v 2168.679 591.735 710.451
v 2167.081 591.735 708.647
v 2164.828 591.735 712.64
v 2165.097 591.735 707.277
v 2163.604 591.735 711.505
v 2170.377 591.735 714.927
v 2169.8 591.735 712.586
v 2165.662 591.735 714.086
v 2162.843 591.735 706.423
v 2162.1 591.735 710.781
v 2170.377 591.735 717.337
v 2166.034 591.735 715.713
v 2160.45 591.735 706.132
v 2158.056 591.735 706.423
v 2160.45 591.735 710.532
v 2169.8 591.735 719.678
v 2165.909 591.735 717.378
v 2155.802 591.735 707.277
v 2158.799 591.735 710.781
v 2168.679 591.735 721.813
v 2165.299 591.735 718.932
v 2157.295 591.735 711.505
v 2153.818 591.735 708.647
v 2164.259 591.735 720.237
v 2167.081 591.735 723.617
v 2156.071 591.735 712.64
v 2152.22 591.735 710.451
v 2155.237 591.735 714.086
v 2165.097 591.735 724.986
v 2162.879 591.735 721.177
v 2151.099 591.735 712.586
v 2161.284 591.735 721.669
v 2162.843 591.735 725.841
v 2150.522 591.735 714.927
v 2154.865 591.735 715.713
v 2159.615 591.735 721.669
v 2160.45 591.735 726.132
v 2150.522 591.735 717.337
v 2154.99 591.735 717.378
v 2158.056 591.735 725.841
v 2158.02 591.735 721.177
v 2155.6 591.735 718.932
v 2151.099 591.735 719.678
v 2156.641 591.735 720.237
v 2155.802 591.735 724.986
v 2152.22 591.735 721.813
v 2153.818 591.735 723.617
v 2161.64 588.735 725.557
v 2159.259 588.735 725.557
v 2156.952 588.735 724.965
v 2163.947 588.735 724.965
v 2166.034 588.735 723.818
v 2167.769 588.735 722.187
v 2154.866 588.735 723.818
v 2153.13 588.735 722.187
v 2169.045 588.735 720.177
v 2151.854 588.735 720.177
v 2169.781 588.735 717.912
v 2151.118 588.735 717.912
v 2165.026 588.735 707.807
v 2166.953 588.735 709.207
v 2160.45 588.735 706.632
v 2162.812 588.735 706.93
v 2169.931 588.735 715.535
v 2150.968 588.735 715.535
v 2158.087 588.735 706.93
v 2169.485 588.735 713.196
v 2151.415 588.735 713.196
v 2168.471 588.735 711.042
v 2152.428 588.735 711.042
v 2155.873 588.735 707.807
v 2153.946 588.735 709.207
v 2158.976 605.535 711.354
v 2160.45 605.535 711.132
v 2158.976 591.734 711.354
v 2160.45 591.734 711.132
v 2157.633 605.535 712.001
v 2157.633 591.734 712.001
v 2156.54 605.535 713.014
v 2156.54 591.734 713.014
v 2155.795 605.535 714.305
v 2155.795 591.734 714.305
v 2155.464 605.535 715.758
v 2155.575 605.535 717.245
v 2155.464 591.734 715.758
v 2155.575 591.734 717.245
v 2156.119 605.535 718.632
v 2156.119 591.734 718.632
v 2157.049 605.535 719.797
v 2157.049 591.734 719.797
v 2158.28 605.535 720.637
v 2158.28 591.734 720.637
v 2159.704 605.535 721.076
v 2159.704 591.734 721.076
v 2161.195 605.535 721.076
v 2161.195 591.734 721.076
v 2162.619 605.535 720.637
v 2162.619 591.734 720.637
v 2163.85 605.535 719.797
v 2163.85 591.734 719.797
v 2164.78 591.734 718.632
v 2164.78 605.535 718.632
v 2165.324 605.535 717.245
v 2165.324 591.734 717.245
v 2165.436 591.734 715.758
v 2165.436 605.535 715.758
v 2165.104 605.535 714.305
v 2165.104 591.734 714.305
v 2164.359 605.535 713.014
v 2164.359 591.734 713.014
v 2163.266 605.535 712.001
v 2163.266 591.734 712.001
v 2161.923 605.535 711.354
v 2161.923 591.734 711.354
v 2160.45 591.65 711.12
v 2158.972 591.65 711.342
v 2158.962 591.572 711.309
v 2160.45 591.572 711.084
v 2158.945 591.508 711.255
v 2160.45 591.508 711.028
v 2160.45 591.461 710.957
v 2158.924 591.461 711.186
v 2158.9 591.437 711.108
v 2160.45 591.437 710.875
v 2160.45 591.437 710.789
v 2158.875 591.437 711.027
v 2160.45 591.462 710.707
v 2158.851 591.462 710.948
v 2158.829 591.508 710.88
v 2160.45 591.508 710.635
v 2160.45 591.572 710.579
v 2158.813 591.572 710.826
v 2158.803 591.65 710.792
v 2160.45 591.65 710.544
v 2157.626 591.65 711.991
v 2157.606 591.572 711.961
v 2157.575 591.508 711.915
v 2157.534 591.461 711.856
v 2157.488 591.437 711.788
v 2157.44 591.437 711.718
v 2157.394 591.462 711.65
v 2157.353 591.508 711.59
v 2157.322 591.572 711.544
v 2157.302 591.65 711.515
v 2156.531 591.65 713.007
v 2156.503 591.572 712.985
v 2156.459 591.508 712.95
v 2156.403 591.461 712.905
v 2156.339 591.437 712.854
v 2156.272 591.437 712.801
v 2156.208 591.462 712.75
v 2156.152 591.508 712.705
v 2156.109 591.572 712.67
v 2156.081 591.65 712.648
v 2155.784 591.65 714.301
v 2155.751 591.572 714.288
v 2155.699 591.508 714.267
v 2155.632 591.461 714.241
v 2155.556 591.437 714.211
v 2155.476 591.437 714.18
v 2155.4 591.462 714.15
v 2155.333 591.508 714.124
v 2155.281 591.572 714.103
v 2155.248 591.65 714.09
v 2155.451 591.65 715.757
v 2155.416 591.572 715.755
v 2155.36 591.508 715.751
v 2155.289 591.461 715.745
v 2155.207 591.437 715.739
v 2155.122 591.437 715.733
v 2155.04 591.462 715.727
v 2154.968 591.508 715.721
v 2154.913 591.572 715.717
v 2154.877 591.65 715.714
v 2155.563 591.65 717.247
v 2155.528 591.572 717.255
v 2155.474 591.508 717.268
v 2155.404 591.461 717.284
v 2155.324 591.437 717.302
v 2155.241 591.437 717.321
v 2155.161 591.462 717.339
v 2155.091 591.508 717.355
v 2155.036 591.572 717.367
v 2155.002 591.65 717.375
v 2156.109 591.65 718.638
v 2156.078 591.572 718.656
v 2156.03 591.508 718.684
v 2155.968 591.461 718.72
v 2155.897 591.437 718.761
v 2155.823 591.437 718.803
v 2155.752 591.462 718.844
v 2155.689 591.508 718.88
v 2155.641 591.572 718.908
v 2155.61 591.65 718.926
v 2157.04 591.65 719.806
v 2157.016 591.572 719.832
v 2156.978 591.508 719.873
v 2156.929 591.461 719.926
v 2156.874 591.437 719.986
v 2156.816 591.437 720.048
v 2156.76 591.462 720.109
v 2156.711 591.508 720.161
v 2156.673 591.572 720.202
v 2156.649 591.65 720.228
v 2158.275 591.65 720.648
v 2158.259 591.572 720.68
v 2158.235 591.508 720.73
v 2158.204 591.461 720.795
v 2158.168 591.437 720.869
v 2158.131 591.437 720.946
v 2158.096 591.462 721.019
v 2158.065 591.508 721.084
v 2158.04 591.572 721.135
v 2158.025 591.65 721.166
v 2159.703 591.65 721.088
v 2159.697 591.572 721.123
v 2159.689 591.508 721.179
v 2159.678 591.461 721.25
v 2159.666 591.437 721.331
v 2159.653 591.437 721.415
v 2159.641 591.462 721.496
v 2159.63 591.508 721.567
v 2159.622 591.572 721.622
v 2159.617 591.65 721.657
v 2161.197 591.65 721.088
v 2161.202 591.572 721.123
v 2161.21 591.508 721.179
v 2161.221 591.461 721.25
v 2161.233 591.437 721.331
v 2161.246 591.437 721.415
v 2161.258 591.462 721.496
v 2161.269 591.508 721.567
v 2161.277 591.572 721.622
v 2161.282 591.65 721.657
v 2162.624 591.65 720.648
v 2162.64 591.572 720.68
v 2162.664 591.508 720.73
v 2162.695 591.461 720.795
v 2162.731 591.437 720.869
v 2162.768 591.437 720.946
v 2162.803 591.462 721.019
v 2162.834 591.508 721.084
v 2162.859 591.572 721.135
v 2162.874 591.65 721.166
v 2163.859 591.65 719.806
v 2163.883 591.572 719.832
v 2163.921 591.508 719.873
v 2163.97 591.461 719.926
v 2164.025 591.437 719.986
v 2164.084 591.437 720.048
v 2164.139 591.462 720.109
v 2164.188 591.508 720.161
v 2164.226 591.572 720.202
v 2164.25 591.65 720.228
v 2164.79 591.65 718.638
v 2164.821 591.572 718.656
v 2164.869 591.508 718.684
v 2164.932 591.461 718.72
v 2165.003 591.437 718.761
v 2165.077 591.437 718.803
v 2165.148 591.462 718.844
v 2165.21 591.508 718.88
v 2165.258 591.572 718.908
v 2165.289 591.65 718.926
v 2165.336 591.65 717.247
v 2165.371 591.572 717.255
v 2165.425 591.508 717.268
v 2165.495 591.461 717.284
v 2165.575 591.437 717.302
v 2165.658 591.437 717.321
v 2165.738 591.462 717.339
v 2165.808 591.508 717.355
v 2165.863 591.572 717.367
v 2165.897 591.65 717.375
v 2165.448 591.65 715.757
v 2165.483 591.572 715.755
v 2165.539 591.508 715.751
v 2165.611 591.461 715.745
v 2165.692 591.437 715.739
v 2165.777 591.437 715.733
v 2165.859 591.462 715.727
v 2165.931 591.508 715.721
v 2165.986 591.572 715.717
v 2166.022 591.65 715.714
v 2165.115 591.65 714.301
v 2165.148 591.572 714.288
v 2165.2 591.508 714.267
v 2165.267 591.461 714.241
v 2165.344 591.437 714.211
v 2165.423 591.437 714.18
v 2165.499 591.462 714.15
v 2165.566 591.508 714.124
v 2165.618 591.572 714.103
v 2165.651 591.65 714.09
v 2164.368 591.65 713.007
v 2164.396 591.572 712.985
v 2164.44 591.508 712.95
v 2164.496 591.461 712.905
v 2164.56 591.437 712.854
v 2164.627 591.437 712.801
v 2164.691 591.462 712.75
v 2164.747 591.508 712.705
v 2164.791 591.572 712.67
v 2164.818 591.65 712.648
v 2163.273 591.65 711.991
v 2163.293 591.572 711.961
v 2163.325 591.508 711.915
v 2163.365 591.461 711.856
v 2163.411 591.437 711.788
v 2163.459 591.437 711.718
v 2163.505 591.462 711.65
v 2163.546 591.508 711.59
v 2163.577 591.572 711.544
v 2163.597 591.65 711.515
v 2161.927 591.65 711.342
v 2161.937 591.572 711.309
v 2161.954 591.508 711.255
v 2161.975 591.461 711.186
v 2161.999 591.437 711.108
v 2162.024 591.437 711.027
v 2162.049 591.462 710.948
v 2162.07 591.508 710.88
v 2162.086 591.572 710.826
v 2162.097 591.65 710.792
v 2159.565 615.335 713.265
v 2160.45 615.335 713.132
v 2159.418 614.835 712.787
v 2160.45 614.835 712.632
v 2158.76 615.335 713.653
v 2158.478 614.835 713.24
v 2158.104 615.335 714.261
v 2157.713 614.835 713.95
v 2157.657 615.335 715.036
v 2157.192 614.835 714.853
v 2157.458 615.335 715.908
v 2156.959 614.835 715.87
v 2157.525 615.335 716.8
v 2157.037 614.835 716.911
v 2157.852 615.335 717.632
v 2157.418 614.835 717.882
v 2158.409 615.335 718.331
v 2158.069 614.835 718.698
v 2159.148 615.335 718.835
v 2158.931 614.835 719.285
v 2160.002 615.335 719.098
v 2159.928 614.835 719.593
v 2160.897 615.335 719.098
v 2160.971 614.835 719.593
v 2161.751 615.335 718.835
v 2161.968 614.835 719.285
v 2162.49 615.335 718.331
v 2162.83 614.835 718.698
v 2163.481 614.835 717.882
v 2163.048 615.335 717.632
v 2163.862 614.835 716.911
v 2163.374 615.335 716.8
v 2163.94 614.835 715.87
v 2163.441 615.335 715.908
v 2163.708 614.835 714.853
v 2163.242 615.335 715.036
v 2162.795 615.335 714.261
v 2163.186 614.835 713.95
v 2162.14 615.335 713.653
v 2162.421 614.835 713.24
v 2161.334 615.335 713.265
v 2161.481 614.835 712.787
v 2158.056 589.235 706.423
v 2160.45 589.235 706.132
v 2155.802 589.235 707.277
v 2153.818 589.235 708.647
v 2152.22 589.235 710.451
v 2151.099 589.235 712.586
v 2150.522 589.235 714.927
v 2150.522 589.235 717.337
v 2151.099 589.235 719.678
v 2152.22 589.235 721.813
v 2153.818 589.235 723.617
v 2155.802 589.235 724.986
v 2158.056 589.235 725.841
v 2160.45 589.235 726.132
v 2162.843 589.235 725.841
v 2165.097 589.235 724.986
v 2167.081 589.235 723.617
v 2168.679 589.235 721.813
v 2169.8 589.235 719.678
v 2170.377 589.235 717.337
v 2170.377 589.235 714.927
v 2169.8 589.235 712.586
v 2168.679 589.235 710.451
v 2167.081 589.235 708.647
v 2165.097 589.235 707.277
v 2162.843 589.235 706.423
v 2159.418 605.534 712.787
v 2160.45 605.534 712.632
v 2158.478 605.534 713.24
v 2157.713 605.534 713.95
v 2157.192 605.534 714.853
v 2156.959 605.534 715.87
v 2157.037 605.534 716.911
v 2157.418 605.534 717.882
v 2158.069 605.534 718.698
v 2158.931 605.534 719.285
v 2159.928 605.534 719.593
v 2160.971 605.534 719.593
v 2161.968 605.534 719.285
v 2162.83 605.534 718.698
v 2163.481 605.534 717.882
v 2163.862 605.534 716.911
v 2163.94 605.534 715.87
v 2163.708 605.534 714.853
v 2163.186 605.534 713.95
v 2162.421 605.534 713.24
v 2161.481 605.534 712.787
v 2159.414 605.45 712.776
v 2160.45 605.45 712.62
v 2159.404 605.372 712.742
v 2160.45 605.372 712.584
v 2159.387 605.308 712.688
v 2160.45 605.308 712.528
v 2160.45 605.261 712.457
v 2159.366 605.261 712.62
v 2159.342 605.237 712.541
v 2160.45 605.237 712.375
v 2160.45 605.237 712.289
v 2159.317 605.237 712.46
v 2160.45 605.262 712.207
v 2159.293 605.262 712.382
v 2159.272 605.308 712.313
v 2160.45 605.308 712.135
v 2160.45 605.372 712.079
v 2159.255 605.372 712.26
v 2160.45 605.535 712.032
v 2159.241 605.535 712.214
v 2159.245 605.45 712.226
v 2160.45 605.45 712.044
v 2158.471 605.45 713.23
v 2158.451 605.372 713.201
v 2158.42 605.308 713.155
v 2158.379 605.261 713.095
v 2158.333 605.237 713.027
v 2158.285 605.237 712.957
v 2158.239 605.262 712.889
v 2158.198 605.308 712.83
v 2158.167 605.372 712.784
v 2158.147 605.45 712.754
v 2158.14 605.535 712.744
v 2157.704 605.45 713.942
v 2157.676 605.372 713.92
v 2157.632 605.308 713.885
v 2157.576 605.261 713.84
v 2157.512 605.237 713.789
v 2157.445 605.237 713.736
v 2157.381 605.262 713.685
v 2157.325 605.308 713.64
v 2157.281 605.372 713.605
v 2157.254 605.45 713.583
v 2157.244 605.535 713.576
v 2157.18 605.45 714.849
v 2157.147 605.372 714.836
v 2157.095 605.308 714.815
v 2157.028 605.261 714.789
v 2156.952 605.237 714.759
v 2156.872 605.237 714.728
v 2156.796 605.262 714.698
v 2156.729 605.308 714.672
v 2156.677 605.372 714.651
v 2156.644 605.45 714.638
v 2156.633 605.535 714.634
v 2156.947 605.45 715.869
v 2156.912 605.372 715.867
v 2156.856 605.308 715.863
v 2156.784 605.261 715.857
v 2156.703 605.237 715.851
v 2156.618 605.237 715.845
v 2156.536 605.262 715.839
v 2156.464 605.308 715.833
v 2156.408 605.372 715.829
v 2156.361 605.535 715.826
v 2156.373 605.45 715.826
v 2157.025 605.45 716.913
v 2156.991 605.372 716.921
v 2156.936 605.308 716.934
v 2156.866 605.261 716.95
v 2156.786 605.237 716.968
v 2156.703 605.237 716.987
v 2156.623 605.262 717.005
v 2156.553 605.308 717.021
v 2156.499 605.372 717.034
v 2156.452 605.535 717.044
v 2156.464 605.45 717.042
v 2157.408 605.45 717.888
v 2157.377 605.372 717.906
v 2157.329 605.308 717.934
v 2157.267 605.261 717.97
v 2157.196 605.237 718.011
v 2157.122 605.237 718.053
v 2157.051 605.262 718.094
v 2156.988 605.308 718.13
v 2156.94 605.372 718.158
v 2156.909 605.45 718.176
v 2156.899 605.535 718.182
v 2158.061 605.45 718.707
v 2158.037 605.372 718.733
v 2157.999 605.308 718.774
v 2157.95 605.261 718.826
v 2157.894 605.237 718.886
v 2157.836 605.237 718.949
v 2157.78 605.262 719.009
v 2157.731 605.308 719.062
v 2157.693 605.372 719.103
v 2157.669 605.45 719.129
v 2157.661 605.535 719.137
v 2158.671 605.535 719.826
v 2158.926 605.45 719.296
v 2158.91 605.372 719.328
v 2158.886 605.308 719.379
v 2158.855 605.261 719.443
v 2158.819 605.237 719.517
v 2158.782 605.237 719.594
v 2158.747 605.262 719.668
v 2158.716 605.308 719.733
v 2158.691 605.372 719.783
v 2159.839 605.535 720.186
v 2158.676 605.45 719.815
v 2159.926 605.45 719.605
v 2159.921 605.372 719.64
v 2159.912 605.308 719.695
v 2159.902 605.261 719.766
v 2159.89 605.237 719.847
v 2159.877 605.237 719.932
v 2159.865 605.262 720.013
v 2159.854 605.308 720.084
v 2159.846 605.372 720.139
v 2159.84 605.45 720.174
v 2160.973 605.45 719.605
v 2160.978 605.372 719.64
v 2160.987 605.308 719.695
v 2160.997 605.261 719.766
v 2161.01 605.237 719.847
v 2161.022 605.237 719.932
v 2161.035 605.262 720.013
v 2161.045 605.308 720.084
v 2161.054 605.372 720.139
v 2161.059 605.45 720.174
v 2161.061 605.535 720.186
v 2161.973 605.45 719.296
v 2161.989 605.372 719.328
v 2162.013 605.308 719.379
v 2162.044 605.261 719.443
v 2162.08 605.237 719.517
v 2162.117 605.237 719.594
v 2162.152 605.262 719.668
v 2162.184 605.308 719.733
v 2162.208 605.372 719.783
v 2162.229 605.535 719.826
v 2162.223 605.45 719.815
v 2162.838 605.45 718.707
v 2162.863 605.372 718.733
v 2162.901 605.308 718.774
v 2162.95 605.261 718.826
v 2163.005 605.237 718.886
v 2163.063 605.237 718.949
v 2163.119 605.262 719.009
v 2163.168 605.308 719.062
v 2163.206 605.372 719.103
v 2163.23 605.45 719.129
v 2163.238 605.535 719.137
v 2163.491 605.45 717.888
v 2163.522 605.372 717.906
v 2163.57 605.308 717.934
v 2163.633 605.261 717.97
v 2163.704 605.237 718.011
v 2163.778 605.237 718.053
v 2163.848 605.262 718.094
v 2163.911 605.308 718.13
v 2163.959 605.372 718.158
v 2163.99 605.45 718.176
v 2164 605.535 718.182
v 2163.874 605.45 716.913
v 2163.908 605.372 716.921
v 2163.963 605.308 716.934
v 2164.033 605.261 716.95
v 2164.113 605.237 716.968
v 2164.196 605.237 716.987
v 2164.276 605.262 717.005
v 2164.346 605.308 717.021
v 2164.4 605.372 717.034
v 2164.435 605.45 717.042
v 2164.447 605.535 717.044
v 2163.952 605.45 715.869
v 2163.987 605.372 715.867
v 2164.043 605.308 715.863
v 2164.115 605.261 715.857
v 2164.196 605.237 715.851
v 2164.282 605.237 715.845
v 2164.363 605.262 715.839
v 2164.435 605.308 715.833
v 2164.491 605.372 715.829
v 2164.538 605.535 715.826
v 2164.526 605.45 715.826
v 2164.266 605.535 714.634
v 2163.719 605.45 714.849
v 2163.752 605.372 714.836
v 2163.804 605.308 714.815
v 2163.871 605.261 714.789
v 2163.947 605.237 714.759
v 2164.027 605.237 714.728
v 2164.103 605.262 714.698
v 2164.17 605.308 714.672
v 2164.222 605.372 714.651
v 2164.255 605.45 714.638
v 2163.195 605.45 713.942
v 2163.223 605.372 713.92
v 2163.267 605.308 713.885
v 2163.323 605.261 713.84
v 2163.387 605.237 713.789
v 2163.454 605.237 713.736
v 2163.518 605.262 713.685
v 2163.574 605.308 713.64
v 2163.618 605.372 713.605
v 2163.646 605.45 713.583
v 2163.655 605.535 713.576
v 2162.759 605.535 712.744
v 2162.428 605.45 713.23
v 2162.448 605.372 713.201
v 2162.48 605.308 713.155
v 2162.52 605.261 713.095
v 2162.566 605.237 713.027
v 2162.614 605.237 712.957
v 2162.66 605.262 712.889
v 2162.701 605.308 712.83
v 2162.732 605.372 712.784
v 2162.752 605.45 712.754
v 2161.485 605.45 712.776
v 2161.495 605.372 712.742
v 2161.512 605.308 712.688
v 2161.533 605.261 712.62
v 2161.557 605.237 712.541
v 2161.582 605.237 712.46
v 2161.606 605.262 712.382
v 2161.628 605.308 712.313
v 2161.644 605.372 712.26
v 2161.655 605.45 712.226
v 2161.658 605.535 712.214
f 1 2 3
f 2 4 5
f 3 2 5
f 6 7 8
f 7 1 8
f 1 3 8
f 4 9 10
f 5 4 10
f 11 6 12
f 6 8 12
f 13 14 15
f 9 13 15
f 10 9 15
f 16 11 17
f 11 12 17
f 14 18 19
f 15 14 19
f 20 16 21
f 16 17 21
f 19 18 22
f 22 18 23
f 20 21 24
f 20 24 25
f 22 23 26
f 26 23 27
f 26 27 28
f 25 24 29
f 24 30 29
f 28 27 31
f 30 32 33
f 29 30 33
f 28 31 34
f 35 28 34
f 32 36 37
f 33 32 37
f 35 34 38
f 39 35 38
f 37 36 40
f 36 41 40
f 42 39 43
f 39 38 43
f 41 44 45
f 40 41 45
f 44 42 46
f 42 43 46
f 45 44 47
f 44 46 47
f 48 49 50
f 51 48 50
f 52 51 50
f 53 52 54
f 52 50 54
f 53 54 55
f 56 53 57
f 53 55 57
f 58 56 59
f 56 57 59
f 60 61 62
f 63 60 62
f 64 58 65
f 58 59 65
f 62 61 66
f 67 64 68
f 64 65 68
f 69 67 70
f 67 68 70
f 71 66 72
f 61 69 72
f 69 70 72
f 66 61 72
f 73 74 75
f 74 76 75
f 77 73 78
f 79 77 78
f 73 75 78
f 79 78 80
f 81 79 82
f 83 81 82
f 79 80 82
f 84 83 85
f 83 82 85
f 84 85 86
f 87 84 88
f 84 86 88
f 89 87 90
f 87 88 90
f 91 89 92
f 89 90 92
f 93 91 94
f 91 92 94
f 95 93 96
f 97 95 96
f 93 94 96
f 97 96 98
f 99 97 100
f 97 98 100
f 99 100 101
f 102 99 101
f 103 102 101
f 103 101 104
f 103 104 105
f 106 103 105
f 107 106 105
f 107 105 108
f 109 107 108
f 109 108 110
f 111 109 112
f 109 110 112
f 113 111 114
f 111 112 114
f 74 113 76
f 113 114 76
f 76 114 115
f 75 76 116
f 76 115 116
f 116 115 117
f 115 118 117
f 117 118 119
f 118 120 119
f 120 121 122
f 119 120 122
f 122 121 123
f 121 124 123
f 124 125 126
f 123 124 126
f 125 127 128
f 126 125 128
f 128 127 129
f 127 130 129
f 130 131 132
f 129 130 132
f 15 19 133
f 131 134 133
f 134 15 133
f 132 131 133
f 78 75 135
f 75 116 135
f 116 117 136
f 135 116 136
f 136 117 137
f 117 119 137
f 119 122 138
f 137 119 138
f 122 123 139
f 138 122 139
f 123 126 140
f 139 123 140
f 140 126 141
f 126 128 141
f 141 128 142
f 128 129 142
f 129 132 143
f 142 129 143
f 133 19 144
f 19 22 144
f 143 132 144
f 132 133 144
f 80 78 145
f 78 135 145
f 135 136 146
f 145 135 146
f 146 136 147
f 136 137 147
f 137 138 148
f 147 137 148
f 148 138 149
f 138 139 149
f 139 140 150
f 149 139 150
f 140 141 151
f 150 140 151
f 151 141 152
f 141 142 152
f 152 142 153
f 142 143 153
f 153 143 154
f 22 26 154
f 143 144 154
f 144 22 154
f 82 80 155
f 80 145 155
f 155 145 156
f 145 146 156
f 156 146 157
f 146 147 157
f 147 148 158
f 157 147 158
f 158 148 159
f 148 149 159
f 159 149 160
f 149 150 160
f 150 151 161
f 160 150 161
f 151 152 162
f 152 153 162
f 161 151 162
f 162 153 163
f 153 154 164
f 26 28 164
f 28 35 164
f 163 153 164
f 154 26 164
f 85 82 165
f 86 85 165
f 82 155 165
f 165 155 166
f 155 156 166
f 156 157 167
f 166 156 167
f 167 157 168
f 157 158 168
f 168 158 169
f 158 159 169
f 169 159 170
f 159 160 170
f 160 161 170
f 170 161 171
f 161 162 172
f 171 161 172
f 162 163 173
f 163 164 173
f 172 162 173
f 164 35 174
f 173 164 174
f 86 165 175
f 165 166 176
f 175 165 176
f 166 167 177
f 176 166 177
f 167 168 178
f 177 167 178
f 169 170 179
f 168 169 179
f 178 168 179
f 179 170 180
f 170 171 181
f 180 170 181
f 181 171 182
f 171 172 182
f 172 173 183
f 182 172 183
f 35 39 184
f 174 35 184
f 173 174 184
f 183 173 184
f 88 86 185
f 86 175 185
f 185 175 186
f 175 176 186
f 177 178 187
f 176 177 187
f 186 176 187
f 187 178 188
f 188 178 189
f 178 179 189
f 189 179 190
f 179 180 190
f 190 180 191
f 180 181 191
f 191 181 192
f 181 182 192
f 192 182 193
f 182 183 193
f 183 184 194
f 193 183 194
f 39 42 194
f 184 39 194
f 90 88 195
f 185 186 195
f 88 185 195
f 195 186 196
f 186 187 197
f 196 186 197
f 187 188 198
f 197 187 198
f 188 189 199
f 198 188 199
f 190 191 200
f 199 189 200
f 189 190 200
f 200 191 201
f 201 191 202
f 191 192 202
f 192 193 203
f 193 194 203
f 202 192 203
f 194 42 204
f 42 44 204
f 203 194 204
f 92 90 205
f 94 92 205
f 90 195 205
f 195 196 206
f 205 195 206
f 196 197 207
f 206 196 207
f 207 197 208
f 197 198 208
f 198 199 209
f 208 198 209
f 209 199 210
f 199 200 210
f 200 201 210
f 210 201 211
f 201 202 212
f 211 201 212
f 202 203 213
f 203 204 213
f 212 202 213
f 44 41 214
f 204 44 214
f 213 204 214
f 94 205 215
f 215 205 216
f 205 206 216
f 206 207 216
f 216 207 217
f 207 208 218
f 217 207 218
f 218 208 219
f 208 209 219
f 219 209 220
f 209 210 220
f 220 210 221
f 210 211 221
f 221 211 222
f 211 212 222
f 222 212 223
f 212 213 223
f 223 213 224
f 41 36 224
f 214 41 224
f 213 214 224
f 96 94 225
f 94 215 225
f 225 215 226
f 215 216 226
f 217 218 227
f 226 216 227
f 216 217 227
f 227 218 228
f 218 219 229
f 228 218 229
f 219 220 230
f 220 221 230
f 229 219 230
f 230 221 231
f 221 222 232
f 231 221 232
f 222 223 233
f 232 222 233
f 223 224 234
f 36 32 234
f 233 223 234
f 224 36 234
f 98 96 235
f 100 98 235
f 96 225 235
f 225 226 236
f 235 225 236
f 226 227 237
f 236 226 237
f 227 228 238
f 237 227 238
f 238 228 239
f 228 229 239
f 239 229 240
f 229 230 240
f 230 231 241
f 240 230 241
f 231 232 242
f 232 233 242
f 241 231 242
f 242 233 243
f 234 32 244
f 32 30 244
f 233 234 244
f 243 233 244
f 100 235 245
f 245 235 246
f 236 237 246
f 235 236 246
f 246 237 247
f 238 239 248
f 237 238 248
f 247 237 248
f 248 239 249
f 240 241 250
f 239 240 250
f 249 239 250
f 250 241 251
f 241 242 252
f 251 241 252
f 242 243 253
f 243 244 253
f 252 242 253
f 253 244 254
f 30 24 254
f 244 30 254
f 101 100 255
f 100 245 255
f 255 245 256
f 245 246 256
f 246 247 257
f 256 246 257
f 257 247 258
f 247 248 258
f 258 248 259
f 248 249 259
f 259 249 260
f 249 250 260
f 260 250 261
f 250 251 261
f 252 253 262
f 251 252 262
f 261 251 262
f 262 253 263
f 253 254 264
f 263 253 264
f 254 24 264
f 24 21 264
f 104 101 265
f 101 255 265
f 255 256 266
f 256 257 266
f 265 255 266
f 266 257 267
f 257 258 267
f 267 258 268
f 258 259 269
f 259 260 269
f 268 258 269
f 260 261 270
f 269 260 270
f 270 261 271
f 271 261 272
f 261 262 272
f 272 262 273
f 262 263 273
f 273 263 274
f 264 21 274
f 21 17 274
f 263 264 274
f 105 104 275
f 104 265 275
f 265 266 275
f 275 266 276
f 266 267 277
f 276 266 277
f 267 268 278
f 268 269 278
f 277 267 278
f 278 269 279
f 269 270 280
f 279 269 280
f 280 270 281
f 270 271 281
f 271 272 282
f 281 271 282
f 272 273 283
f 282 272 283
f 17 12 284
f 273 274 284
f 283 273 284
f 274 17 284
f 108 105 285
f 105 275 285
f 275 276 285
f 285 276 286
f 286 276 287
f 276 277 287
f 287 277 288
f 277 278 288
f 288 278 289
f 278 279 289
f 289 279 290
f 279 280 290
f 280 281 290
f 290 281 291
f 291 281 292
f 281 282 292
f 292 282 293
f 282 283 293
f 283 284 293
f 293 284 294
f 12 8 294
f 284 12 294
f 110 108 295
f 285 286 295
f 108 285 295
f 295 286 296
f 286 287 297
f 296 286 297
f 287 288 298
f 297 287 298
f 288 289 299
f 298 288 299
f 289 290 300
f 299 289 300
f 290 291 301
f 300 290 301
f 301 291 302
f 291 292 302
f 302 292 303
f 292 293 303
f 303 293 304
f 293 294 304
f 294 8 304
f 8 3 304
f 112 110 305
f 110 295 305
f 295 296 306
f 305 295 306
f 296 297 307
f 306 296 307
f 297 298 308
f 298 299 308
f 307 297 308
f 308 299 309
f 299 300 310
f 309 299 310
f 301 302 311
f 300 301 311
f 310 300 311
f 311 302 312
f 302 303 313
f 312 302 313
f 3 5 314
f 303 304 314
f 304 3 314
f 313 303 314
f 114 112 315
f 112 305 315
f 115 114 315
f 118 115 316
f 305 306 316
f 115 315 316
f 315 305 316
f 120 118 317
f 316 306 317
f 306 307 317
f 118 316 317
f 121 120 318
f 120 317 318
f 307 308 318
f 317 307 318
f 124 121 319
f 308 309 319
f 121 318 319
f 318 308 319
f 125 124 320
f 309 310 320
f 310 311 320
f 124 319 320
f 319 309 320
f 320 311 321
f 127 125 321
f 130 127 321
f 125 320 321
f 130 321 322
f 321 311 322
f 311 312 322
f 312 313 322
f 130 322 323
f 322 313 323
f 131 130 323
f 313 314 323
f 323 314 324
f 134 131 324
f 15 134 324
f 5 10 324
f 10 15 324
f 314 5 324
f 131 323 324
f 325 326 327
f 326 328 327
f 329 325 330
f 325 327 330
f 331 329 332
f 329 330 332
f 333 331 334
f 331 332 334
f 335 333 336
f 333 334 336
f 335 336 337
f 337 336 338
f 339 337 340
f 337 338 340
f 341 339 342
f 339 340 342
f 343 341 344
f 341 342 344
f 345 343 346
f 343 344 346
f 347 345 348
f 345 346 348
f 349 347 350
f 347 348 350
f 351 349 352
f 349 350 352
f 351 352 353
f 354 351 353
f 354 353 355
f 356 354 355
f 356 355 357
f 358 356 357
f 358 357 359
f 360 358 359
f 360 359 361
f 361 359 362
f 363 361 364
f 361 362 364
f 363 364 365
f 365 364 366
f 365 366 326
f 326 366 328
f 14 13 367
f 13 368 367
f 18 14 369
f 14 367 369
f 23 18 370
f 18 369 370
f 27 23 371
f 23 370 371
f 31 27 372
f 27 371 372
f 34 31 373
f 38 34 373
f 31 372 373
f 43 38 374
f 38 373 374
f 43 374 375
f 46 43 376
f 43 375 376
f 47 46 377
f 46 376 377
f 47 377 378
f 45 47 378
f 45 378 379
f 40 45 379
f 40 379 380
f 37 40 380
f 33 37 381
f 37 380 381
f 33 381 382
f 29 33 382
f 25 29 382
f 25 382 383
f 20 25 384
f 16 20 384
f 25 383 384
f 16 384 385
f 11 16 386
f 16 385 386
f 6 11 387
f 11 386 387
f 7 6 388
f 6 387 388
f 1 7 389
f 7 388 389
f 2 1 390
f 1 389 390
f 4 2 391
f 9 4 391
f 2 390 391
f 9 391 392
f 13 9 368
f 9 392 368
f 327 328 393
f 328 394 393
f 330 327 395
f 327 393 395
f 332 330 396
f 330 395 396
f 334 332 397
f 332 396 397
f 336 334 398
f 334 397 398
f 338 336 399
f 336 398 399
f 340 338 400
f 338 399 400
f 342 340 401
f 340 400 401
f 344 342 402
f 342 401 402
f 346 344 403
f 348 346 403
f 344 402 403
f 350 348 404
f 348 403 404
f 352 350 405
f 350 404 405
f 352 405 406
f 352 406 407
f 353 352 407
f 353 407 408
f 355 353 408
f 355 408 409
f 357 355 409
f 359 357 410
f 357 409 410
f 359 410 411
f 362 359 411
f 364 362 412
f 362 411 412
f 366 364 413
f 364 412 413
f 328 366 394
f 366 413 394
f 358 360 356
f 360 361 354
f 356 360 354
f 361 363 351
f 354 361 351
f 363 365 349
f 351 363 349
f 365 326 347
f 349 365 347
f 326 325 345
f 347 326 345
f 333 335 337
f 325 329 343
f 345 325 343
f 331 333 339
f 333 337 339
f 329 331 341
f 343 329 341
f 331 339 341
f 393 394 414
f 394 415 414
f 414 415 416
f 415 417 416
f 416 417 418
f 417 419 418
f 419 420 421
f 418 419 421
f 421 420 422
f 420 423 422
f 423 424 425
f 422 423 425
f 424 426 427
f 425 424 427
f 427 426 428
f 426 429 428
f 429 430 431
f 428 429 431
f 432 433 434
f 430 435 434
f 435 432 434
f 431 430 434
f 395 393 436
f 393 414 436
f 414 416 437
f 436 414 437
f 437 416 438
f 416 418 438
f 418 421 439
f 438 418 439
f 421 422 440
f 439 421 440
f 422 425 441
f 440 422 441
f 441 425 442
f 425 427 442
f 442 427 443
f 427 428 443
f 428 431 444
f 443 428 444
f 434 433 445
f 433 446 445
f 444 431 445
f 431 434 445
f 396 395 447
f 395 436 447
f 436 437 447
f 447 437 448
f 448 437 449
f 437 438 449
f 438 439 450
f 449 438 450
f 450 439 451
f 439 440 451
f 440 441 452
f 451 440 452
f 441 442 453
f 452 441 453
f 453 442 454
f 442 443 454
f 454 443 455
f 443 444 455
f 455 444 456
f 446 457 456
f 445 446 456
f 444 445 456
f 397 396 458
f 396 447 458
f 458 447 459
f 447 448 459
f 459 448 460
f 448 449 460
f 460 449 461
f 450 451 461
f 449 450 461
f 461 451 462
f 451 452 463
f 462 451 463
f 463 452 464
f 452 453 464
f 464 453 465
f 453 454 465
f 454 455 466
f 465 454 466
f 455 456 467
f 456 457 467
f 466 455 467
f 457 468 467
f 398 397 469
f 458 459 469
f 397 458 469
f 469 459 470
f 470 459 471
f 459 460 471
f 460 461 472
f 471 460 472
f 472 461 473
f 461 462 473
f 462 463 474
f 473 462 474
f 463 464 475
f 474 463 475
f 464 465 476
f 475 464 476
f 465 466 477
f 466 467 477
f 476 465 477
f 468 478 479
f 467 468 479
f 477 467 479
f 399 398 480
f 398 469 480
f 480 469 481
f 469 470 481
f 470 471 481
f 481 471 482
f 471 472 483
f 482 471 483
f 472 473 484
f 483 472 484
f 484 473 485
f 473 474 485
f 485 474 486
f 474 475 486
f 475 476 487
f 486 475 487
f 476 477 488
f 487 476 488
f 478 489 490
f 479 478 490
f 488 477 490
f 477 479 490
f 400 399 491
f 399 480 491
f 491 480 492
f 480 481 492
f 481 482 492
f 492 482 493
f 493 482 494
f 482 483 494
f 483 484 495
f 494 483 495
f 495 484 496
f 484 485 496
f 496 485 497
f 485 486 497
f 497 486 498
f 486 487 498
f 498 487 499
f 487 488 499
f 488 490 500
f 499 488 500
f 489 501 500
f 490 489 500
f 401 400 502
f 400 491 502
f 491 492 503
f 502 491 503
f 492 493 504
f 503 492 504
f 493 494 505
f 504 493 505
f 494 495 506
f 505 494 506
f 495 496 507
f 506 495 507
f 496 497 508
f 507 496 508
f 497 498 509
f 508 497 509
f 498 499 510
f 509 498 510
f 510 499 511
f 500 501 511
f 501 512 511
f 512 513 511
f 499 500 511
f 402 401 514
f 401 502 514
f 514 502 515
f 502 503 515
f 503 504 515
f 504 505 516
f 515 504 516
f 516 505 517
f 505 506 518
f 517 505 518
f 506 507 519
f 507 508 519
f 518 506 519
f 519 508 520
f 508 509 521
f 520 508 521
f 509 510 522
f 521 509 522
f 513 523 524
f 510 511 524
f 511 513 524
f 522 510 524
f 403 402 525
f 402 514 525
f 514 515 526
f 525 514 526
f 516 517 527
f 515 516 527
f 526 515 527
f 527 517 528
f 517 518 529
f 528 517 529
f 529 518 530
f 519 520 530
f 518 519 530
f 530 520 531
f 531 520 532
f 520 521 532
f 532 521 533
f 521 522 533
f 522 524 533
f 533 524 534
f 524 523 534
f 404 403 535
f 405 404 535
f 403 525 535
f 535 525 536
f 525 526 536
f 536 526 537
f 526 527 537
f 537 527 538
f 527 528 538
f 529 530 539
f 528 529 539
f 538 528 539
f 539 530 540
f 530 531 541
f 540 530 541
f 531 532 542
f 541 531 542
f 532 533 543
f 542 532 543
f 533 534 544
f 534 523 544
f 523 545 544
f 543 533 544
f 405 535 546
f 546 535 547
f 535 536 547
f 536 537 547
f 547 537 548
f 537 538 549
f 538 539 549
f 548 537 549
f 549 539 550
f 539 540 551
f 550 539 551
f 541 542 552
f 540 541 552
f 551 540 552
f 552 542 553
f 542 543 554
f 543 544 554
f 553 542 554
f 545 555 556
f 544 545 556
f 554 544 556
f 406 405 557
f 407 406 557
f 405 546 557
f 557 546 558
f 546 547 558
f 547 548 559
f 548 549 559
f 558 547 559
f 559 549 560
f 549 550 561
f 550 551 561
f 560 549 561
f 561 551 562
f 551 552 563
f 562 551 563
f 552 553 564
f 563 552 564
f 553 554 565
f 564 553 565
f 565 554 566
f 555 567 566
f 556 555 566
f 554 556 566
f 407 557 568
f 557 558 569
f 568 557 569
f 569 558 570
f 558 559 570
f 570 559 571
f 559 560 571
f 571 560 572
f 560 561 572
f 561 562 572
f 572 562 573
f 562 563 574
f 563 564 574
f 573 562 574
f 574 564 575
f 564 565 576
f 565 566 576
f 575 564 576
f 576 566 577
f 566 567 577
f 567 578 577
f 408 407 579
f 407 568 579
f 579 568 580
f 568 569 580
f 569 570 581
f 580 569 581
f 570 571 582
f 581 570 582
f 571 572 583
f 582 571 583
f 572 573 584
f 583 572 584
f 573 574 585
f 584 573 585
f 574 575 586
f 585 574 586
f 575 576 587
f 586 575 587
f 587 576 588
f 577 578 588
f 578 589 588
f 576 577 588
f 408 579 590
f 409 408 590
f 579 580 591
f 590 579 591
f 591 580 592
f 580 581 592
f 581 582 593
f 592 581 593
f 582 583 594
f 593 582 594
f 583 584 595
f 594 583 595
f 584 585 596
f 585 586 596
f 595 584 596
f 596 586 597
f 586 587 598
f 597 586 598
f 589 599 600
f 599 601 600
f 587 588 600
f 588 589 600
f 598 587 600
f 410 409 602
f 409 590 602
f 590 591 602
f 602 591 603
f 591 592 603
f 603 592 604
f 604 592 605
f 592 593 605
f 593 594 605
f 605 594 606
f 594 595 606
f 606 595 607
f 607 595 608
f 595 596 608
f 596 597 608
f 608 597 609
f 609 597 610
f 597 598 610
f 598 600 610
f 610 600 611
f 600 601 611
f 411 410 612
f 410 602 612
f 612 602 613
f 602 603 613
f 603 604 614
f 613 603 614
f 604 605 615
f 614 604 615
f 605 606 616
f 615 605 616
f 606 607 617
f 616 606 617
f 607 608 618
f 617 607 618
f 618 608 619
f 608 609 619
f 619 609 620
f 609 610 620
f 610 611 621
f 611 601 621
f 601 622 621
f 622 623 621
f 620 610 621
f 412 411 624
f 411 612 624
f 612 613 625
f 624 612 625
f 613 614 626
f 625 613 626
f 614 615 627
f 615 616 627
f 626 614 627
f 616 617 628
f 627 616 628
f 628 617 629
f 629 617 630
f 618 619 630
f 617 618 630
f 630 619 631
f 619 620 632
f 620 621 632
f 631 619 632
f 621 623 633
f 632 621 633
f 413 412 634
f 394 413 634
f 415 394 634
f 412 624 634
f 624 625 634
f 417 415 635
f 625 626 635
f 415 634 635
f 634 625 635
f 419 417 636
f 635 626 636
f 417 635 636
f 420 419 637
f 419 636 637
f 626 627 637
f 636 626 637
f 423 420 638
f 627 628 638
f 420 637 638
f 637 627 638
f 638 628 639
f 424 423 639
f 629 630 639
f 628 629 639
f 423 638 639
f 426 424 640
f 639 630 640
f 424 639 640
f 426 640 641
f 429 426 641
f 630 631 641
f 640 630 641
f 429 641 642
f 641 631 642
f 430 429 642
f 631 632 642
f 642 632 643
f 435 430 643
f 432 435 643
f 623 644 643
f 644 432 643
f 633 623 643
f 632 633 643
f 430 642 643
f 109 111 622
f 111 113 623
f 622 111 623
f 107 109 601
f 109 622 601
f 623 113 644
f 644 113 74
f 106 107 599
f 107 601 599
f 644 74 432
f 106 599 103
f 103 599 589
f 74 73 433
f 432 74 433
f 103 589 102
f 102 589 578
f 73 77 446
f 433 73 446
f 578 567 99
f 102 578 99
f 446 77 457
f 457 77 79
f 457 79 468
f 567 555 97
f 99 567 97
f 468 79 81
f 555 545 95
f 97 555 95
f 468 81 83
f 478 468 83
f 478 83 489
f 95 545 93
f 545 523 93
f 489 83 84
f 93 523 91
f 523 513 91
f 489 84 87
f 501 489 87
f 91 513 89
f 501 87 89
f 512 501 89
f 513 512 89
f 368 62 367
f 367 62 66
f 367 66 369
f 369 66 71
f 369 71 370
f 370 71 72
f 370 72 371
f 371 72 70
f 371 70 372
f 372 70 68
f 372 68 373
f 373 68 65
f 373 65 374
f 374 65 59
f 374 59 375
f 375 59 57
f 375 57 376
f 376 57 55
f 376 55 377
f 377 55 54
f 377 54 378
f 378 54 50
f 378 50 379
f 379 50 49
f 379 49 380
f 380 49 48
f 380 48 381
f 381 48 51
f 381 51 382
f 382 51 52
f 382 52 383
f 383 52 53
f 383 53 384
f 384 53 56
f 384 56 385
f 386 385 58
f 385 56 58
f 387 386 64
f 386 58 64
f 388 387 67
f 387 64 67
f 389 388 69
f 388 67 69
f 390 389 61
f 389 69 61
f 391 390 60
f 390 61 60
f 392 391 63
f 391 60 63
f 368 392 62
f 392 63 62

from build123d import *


with BuildPart() as part:
    # Esquisse1 → Base-Révolution (revolve)
    with BuildSketch(Plane(origin=(0, 0, 716.131939029), x_dir=(-1, 0, 0), z_dir=(0, 0, -1)), mode=Mode.PRIVATE) as base_r_volution_sk:
        with BuildLine():
            Line((-2169.949576888, 588.734614361), (-2160.449576888, 588.734614361))
            Line((-2160.449576888, 588.734614361), (-2160.449576888, 615.334513232))
            Line((-2160.449576888, 615.334513232), (-2163.449576888, 615.334513232))
            Line((-2163.449576888, 615.334513232), (-2163.949576888, 614.834513232))
            Line((-2163.949576888, 614.834513232), (-2163.949576888, 605.534359442))
            ThreePointArc((-2163.949576888, 605.534359442), (-2164.249653642, 605.234359452), (-2164.549576849, 605.53451295))
            Line((-2164.549576849, 605.53451295), (-2165.449576888, 605.53451295))
            Line((-2165.449576888, 605.53451295), (-2165.449576888, 591.734359161))
            ThreePointArc((-2165.449576888, 591.734359161), (-2165.749653787, 591.434359171), (-2166.049576849, 591.734512958))
            Line((-2166.049576849, 591.734512958), (-2170.449576888, 591.734512958))
            Line((-2170.449576888, 591.734512958), (-2170.449576888, 589.234614361))
            Line((-2170.449576888, 589.234614361), (-2169.949576888, 588.734614361))
        make_face()
    revolve(base_r_volution_sk.sketch.rotate(Axis((2160.449576888, 588.734614361, 716.131939029), (0, 1, 0)), 90), axis=Axis((2160.449576888, 588.734614361, 716.131939029), (0, 1, 0)))


solid = part.part
